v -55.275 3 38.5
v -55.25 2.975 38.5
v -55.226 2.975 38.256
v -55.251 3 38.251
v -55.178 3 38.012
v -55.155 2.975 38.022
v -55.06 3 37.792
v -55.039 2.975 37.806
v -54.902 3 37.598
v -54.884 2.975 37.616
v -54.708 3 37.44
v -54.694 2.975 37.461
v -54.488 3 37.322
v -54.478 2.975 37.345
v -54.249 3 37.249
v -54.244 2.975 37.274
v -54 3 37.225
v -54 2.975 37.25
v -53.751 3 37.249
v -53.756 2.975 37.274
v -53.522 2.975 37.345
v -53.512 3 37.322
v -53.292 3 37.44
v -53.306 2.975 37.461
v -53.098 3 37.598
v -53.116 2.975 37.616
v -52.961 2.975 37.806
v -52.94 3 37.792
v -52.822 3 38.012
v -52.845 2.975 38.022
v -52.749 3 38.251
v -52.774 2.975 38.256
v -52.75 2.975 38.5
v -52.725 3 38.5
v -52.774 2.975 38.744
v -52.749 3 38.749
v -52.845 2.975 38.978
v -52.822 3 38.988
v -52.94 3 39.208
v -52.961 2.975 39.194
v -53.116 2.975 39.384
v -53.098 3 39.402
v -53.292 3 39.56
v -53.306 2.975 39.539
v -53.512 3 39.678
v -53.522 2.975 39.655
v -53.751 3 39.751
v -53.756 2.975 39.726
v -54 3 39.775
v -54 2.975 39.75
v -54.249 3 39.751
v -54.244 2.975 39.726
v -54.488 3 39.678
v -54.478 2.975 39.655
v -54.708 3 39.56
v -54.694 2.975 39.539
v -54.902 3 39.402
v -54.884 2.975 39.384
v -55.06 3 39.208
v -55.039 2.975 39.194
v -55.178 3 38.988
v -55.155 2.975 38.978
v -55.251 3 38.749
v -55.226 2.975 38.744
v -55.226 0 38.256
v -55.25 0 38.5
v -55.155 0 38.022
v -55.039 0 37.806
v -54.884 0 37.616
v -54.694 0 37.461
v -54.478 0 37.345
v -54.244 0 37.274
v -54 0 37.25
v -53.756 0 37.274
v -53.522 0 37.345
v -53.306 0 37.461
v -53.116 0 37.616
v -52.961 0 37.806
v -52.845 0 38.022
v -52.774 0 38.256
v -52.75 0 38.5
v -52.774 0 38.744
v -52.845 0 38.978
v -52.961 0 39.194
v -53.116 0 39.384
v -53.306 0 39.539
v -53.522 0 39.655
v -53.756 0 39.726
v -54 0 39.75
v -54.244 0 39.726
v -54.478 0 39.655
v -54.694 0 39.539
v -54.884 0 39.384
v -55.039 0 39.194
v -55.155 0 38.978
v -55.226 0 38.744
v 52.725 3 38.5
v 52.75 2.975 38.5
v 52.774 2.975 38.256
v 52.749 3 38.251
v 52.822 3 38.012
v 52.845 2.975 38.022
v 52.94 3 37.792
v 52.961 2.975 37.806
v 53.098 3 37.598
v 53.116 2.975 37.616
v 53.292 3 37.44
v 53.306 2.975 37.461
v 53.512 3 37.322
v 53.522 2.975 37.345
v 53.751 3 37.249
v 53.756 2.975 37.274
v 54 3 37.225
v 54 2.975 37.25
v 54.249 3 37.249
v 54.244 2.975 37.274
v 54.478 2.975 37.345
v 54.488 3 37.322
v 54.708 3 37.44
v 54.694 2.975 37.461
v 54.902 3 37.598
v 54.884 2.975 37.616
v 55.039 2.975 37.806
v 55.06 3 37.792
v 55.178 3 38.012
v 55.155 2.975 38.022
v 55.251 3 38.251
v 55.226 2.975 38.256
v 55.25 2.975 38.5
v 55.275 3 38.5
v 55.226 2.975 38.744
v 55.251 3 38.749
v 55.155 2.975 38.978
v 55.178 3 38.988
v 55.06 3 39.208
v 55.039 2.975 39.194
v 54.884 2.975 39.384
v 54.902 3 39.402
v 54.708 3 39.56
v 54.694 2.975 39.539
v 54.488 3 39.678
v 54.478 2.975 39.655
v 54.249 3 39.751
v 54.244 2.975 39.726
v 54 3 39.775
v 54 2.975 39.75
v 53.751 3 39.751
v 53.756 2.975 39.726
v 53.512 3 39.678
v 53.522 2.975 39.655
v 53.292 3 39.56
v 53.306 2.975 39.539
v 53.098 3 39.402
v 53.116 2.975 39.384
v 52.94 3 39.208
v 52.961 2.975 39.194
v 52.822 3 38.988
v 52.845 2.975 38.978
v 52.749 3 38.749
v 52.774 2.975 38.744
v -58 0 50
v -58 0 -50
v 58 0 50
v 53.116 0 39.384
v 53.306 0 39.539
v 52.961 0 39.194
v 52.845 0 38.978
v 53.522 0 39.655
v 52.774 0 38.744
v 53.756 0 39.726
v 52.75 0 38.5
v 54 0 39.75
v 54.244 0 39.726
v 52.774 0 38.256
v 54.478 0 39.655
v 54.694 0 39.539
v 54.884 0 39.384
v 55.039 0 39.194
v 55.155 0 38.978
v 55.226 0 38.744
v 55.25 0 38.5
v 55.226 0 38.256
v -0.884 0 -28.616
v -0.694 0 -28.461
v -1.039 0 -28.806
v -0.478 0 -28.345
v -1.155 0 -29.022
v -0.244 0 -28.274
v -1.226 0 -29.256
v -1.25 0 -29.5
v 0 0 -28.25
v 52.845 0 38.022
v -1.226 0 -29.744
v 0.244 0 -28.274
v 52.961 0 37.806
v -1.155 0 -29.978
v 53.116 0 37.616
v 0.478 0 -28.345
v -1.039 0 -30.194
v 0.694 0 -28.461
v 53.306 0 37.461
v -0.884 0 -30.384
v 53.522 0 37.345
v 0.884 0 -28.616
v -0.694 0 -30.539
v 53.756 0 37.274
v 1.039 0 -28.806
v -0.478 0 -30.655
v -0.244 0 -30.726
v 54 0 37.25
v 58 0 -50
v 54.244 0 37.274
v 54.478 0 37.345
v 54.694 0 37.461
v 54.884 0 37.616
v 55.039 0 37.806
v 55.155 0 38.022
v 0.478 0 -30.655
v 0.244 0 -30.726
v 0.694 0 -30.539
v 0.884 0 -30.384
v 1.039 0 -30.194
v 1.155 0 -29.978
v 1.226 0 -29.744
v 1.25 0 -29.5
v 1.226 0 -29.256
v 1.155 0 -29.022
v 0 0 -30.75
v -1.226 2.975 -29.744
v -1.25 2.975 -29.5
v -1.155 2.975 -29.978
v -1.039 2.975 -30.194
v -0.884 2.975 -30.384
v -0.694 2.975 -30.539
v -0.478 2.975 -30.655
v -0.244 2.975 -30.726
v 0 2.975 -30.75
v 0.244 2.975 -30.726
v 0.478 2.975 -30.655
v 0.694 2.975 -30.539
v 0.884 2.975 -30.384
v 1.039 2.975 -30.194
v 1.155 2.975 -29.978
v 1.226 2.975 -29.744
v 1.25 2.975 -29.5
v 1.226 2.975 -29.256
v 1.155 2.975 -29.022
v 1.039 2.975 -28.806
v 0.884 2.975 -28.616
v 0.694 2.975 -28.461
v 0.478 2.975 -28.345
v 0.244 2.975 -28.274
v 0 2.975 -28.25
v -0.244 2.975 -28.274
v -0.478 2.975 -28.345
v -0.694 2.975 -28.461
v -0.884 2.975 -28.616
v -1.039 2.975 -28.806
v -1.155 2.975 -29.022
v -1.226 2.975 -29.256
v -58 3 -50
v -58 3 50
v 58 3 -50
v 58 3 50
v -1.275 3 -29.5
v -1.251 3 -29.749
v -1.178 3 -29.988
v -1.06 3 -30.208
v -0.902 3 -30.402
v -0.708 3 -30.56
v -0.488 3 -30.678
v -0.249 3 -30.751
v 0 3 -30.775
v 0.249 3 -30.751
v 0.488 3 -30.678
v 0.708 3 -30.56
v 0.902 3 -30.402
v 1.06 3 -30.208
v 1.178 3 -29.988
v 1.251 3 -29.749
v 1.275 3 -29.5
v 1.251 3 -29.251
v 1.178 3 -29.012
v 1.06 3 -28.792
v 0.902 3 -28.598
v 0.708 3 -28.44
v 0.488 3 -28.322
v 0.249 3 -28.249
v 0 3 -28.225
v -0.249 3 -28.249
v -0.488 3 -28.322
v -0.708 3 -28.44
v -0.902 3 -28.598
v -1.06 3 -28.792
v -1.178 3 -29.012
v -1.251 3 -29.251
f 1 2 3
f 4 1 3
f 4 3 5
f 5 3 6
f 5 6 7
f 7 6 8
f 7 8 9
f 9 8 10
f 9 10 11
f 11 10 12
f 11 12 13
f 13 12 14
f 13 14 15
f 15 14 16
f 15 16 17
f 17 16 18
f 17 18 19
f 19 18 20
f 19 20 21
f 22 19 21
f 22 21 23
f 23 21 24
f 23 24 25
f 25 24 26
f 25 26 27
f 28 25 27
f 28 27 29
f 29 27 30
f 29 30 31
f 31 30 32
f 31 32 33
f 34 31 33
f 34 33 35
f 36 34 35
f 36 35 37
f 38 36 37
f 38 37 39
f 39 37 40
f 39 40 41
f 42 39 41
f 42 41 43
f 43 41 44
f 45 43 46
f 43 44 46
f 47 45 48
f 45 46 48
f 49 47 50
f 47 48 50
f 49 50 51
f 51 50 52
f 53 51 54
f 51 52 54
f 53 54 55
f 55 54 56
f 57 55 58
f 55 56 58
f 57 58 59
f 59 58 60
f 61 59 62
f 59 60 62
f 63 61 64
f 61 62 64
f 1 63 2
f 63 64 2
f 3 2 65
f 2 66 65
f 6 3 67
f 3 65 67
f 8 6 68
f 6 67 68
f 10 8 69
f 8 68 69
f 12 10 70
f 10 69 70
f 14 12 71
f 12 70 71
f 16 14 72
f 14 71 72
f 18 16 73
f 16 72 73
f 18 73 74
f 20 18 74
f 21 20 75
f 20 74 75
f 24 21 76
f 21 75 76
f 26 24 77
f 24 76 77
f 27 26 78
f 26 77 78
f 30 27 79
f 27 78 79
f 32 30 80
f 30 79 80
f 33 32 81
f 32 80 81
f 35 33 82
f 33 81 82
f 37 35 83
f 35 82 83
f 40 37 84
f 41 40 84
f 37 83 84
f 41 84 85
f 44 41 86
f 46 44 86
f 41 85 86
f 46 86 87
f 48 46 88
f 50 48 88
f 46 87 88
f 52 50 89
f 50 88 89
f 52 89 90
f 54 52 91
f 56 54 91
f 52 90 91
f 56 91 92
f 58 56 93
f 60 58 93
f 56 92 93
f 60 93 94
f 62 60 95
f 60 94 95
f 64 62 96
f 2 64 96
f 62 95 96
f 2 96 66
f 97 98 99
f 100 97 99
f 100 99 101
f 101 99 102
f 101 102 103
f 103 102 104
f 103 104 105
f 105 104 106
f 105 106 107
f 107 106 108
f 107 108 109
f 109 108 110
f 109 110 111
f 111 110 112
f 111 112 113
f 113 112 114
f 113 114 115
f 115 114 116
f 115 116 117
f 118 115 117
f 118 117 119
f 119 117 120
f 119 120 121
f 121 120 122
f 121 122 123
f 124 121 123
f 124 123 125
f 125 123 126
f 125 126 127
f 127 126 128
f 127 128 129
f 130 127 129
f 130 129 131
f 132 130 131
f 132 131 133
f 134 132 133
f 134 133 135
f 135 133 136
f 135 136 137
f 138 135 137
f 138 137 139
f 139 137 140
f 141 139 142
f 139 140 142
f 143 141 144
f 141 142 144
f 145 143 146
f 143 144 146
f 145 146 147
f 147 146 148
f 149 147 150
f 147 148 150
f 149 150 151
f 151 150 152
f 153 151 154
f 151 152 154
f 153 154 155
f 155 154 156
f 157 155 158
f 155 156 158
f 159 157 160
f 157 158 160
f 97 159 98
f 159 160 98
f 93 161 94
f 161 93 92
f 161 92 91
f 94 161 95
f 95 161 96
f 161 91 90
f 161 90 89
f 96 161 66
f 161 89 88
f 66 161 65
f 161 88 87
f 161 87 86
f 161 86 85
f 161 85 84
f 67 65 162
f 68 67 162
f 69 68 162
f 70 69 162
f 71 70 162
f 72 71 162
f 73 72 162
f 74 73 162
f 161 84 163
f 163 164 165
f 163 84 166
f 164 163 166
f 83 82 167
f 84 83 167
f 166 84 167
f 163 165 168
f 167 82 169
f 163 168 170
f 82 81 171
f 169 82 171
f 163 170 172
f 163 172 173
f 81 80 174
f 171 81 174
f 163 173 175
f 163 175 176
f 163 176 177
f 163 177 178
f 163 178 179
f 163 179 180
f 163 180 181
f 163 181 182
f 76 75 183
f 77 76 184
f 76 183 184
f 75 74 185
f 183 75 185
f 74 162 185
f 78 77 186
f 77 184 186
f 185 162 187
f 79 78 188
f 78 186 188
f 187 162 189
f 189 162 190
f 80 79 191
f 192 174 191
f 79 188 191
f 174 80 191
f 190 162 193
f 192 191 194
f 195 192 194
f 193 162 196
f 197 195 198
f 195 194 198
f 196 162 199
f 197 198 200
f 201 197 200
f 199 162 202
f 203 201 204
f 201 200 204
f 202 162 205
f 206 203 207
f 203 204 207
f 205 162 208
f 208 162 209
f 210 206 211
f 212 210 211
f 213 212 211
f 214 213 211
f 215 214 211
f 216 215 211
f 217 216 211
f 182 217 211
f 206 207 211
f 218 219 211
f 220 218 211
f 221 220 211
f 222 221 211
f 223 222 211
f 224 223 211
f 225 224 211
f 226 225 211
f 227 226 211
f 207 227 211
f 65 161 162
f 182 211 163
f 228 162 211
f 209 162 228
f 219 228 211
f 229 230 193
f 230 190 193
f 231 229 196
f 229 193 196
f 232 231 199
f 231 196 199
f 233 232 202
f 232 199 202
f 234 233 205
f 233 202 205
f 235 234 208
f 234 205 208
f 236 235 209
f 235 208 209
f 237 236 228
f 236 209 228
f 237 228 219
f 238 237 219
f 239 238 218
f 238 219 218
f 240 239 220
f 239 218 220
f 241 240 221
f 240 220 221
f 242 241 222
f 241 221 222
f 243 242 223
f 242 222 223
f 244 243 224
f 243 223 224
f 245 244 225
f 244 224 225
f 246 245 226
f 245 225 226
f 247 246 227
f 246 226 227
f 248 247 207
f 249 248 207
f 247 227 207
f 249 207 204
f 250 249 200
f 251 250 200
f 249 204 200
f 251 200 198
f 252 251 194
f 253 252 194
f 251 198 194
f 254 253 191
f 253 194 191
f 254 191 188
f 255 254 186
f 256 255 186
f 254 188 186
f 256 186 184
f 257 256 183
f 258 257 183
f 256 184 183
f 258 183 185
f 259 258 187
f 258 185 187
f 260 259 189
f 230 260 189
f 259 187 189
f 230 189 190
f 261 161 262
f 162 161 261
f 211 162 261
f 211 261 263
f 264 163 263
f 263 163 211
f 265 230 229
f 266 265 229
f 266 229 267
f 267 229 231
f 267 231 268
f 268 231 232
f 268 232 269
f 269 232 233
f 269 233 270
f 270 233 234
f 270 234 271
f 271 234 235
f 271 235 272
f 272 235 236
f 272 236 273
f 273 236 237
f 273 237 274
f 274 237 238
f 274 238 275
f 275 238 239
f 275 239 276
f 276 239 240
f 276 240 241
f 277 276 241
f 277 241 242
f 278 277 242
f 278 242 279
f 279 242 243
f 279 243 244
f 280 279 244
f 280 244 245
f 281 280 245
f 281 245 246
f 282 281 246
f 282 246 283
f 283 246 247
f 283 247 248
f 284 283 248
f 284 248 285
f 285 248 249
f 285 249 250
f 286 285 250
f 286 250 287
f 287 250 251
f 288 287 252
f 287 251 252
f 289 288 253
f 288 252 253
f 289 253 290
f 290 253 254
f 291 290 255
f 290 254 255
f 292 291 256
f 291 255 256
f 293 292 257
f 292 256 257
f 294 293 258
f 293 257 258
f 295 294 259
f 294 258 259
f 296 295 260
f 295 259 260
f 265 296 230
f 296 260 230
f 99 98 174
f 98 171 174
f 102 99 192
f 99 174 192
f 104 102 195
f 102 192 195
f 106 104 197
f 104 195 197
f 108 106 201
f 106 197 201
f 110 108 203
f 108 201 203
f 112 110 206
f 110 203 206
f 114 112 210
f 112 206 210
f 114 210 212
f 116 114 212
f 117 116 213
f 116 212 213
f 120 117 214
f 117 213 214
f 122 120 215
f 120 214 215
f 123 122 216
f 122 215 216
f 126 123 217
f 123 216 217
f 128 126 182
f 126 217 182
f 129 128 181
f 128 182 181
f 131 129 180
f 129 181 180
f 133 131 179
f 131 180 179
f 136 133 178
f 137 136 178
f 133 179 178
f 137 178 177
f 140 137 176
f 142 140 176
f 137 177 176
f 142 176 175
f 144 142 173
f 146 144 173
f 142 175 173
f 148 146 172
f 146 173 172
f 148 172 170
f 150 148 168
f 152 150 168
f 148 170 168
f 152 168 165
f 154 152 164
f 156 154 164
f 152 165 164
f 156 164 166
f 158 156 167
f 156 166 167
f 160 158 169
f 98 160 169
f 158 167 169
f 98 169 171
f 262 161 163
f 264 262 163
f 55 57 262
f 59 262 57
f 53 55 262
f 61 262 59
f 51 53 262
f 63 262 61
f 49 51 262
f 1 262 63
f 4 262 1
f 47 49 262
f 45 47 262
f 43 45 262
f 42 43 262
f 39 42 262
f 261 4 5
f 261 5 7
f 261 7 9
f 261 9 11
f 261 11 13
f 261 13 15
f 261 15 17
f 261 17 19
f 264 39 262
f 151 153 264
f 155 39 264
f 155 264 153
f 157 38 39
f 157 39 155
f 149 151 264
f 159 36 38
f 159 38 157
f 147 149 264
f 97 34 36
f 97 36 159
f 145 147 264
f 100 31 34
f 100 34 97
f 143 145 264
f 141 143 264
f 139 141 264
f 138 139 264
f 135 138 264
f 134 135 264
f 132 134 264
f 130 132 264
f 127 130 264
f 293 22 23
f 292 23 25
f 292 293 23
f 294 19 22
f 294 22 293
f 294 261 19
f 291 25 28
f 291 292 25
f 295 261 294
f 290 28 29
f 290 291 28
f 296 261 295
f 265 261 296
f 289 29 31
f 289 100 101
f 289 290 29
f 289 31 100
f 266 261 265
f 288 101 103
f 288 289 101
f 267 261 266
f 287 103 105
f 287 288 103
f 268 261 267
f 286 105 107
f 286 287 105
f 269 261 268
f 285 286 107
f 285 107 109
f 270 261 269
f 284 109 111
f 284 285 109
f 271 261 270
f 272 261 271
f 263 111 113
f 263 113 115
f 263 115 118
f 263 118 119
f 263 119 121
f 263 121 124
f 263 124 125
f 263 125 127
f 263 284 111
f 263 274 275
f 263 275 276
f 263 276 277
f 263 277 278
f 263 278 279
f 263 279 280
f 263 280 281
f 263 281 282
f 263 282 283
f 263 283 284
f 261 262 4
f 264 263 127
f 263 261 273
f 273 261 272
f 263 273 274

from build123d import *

# Parameters (mm, degrees)
SKETCH1_W                         = 116
SKETCH1_H                         = 100
BOSS_EXTRUDE1_DEPTH               = 3
TAP_DRILL_FOR_M3_TAP1_D           = 2.5
TAP_DRILL_FOR_M3_TAP1_CSINK_D     = 2.55
TAP_DRILL_FOR_M3_TAP1_CSINK_ANGLE = 90


with BuildPart() as part:
    # Sketch1 → Boss-Extrude1 (new body)
    with BuildSketch(Plane(origin=(0, 0, 0), x_dir=(1, 0, 0), z_dir=(0, 1, 0))):
        Rectangle(SKETCH1_W, SKETCH1_H)
    extrude(amount=BOSS_EXTRUDE1_DEPTH)

    # Tap Drill for M3 Tap1 (through all)
    with Locations(Plane(origin=(0, 3, 0), x_dir=(1, 0, 0), z_dir=(0, 1, 0))):
        with Locations((0, 29.5), (-54, -38.5), (54, -38.5)):
            CounterSinkHole(TAP_DRILL_FOR_M3_TAP1_D / 2, TAP_DRILL_FOR_M3_TAP1_CSINK_D / 2, counter_sink_angle=TAP_DRILL_FOR_M3_TAP1_CSINK_ANGLE)


solid = part.part
